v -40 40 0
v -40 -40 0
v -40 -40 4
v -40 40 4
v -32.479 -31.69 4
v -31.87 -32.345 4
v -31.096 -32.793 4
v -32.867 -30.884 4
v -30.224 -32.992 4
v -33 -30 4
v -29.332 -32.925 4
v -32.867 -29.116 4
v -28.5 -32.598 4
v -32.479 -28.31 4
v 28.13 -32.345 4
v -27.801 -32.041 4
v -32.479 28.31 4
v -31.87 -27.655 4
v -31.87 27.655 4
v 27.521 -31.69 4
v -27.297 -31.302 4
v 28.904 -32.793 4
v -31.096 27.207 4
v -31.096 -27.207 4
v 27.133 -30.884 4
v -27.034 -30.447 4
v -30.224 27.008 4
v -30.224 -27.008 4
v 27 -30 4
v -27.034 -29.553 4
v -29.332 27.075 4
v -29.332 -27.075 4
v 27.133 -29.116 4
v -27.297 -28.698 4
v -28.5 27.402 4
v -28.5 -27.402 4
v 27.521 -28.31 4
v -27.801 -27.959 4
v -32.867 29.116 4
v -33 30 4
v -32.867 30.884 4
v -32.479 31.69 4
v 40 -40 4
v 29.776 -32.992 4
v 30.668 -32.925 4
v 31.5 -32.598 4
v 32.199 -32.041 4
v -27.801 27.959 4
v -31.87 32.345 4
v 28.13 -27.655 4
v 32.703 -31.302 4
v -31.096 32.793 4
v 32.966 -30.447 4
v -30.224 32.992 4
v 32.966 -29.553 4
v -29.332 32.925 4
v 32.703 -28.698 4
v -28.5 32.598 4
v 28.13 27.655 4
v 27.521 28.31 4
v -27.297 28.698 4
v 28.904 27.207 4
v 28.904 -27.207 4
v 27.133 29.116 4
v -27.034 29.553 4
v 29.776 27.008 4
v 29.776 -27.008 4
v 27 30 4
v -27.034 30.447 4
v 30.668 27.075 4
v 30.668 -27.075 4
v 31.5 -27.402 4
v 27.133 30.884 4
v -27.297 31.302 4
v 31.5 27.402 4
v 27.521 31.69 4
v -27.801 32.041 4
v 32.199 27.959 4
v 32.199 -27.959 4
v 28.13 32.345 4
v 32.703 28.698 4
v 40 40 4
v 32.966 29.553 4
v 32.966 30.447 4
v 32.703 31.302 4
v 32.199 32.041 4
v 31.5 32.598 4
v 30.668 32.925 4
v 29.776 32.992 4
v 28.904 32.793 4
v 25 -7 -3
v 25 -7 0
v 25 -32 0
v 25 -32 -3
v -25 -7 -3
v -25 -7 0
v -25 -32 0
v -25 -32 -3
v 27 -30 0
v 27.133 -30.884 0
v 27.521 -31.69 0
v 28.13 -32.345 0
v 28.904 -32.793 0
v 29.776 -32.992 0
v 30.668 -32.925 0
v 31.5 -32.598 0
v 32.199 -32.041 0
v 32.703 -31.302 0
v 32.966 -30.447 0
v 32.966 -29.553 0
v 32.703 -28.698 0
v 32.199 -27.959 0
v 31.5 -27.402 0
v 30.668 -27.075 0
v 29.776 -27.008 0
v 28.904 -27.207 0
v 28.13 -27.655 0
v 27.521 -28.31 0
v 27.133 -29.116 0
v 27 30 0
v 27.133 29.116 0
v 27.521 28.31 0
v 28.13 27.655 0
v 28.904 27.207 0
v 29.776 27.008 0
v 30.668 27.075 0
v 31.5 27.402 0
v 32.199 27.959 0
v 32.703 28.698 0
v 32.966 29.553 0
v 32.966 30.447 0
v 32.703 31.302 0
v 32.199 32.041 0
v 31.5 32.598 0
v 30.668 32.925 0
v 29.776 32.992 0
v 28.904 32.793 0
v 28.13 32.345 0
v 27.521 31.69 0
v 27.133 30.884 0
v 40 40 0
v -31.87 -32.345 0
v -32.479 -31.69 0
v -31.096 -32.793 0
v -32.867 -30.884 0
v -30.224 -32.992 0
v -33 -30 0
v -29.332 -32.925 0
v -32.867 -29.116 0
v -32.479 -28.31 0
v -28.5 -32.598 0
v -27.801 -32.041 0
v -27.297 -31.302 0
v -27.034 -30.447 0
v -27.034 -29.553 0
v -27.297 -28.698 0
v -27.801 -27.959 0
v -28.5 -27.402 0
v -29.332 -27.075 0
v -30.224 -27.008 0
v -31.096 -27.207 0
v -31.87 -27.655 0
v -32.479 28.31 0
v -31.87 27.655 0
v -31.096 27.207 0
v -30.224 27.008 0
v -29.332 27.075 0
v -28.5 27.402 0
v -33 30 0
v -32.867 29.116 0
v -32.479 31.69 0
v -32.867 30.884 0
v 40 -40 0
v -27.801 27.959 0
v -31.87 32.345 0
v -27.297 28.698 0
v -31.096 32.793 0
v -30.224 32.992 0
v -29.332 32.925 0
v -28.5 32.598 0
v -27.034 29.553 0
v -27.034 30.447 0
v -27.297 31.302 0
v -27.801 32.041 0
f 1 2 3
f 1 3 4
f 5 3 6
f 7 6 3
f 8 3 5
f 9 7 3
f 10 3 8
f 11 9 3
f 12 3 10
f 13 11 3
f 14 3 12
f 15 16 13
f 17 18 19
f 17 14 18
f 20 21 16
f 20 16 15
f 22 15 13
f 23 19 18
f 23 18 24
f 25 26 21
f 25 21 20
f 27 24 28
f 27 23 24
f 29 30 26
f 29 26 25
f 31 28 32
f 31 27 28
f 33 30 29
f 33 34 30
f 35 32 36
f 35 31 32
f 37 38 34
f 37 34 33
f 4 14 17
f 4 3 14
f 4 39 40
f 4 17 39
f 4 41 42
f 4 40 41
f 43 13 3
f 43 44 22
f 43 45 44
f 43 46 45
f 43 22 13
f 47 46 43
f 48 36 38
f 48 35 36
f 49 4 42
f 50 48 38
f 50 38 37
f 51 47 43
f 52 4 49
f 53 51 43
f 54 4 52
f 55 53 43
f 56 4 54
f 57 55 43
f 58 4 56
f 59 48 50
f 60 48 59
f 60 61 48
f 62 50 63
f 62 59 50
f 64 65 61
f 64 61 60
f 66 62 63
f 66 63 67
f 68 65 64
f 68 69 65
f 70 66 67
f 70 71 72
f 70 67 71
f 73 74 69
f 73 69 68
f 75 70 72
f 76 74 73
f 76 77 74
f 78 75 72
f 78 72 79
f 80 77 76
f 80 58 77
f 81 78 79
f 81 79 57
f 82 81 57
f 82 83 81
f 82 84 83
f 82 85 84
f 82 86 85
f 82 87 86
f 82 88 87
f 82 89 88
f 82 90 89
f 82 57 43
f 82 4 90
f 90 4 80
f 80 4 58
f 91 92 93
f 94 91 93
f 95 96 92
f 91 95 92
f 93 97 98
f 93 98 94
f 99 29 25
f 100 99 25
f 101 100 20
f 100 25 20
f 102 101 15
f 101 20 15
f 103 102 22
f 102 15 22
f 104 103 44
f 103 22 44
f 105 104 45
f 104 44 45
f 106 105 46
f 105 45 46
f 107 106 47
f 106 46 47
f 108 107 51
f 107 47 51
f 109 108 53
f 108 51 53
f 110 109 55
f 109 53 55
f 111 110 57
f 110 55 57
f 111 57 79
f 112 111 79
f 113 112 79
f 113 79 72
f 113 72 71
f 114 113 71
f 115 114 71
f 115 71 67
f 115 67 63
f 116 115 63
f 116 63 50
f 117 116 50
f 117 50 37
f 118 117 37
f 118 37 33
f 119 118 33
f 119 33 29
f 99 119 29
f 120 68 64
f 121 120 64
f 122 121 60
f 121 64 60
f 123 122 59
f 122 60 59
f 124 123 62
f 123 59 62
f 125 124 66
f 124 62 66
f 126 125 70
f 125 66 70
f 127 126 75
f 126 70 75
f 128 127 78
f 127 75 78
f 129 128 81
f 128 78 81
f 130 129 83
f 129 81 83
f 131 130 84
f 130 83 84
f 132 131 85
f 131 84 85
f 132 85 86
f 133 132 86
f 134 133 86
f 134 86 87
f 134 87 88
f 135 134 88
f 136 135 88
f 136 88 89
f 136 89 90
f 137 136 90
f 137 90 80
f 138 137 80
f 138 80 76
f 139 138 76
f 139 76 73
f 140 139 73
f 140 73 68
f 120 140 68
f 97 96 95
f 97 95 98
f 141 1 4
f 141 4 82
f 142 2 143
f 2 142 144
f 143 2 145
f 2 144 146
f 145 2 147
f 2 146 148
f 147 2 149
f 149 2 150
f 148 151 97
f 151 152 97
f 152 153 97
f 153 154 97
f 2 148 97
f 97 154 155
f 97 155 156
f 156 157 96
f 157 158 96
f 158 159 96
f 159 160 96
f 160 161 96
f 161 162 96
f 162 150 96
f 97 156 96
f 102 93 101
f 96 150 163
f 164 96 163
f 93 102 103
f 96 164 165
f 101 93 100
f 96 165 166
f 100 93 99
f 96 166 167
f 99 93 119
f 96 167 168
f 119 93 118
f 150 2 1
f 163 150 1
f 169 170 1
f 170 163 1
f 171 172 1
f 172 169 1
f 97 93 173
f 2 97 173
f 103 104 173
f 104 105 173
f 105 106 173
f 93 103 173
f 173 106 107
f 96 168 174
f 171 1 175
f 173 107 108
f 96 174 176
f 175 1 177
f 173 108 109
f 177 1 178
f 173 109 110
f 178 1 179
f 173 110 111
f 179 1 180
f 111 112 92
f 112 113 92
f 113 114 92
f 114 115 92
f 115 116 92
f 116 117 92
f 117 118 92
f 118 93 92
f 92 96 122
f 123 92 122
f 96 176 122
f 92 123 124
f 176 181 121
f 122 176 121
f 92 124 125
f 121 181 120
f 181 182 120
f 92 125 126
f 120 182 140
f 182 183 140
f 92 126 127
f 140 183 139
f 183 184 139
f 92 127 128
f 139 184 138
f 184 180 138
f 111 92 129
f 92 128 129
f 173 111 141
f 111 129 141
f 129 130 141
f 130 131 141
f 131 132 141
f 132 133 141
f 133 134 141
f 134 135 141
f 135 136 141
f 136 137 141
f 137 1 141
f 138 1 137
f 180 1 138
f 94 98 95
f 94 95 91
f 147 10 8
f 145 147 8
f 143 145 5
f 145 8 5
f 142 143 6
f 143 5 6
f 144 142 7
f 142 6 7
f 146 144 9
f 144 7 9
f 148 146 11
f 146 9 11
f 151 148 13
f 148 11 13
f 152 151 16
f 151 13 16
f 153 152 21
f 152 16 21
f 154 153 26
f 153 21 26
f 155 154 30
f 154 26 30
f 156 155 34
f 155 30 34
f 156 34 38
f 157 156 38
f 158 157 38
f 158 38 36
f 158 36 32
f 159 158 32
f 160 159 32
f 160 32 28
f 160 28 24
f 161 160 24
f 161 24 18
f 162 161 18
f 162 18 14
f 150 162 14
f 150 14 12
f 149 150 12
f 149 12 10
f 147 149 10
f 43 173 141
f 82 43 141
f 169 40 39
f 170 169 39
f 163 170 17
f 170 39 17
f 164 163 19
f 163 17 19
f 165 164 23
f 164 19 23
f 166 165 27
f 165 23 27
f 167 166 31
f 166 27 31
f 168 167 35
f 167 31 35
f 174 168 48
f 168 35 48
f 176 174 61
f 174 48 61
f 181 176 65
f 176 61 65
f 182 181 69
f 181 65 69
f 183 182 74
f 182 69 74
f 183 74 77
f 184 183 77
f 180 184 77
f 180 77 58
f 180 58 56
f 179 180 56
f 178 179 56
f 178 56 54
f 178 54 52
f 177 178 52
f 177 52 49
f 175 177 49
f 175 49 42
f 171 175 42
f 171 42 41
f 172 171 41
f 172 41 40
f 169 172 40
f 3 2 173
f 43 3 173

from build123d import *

# Parameters (mm, degrees)
F0_W     = 80
F0_H     = 80
F1_DEPTH = 4
F2_W     = 50
F2_H     = 25
F3_DEPTH = 3
F4_D     = 6


with BuildPart() as f1:
    # F0 (on Top) → F1 (new body)
    with BuildSketch(Plane.XY):
        Rectangle(F0_W, F0_H)
    extrude(amount=F1_DEPTH)

    # F2 (on face) → F3 (join)
    with BuildSketch(Plane(origin=(0, 0, 0), x_dir=(1, 0, 0), z_dir=(0, 0, -1))):
        with Locations((0, 19.5)):
            Rectangle(F2_W, F2_H)
    extrude(amount=F3_DEPTH)

    # F4 (through all)
    with Locations(Plane(origin=(0, 0, 0), x_dir=(1, 0, 0), z_dir=(0, 0, -1))):
        with Locations((-30, 30), (30, 30), (30, -30), (-30, -30)):
            Hole(F4_D / 2)


solid = f1.part
